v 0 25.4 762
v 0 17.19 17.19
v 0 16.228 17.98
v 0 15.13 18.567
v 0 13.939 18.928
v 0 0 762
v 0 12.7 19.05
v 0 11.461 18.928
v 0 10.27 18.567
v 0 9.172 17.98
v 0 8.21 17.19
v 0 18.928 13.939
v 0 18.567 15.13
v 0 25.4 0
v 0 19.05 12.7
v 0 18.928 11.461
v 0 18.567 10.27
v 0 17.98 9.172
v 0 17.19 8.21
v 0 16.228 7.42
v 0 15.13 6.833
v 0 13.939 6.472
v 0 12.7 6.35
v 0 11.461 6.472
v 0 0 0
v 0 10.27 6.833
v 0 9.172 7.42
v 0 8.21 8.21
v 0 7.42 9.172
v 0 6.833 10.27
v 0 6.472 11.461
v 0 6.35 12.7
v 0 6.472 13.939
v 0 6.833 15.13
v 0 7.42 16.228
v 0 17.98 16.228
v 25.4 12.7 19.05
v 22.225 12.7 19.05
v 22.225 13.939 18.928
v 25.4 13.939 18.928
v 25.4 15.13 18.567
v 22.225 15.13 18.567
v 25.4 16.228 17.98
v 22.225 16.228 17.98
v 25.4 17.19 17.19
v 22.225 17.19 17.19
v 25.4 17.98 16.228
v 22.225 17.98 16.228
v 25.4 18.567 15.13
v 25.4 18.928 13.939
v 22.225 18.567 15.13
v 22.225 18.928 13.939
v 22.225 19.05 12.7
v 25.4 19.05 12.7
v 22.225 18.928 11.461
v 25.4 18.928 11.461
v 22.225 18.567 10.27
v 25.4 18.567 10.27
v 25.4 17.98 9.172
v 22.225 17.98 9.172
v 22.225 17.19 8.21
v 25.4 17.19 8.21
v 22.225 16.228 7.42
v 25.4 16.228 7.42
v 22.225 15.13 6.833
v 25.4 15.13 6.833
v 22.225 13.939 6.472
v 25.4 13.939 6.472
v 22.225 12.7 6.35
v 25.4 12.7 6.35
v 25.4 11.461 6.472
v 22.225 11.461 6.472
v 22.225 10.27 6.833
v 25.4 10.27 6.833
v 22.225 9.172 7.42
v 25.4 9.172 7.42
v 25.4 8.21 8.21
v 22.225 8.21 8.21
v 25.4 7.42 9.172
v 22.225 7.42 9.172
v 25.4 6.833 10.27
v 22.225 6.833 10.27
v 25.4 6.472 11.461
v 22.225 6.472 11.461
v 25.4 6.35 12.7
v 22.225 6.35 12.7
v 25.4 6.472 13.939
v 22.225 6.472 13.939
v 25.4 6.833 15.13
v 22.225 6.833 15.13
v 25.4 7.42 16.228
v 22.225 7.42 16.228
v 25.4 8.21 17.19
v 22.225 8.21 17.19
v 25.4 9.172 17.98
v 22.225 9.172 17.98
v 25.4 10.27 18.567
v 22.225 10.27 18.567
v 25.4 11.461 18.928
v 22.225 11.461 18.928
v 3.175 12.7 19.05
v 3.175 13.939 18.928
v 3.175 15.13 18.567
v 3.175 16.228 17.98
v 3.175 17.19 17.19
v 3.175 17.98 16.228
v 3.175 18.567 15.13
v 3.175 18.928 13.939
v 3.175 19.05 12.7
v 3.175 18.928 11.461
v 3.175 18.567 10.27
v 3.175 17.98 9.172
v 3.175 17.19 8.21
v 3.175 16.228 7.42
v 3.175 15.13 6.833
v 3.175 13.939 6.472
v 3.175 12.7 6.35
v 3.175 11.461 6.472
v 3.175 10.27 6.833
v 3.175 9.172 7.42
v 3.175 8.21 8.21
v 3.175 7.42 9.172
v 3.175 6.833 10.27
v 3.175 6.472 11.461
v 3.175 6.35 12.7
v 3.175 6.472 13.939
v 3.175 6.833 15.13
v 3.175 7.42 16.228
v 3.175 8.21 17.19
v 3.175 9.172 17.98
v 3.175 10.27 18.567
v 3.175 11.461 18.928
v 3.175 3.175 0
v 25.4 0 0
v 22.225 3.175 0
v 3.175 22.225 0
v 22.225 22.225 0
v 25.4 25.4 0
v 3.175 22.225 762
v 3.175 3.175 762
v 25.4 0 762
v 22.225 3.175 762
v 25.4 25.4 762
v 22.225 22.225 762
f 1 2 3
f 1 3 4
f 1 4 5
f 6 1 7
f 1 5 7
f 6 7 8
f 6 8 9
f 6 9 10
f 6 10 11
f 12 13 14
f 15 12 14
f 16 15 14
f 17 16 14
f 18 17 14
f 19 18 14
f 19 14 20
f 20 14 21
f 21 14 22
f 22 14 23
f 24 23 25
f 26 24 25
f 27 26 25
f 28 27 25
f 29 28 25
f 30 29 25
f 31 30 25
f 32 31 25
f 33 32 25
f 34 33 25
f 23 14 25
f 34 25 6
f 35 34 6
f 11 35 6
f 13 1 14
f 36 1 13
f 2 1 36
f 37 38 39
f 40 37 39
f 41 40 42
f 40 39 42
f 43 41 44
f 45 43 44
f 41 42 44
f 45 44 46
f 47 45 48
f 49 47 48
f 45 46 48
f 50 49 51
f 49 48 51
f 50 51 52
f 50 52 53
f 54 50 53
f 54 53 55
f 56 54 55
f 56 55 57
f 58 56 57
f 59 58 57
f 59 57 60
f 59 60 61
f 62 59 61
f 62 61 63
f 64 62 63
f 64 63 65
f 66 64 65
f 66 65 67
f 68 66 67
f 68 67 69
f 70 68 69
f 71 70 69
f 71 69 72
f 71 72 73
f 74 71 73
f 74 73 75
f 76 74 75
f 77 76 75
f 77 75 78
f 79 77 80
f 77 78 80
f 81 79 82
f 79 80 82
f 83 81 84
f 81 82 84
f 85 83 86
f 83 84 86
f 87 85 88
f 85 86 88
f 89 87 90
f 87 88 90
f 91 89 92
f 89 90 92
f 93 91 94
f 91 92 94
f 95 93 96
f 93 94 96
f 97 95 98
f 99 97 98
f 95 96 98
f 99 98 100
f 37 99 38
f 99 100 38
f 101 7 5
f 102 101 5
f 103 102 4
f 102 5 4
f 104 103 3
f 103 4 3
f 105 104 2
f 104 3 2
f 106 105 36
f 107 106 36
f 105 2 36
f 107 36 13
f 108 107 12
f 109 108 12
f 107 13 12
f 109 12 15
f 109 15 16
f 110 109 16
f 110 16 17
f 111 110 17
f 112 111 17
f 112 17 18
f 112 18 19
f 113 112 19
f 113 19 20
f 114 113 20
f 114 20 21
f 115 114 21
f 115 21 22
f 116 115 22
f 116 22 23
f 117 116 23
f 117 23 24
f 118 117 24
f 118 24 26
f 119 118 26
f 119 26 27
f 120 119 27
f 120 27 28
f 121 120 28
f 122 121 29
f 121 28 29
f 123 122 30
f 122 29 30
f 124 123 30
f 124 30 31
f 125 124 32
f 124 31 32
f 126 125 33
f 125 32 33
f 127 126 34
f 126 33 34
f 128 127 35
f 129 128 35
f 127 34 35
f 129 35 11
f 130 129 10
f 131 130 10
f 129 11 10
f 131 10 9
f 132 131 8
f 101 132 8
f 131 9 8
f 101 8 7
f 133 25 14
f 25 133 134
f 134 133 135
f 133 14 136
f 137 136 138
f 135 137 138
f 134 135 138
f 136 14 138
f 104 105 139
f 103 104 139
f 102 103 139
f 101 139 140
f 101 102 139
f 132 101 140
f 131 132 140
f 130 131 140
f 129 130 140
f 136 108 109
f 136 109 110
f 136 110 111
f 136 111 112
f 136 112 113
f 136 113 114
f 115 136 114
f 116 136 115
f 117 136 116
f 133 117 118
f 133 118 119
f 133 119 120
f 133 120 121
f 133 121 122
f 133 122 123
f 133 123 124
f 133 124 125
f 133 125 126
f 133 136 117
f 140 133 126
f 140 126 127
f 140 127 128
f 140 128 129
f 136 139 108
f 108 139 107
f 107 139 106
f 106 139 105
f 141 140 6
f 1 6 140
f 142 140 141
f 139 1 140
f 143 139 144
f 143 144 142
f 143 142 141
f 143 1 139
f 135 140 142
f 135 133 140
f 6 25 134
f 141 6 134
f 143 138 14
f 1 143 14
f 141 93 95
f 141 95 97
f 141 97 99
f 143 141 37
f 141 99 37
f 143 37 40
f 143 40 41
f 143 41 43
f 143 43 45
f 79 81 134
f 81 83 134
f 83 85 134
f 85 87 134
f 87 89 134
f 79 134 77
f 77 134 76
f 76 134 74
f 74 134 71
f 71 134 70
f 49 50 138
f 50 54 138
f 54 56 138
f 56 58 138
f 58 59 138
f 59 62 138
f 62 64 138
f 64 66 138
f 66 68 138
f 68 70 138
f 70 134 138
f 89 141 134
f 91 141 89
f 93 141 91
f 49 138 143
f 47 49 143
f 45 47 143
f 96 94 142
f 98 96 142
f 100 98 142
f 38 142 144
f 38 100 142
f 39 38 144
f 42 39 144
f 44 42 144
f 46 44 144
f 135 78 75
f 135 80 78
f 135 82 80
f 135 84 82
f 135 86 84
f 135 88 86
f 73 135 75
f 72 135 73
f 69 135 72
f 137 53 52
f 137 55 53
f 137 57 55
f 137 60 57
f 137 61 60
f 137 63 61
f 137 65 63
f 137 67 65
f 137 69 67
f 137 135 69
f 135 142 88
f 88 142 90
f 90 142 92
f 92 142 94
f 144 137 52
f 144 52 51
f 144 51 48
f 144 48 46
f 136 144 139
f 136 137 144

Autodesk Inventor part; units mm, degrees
ref_plane "YZ Plane" through (0, 0, 0) normal (1, 0, 0) x (0, 1, 0)
ref_plane "XZ Plane" through (0, 0, 0) normal (0, 1, 0) x (-1, 0, 0)
ref_plane "XY Plane" through (0, 0, 0) normal (0, 0, 1) x (1, 0, 0)
sketch "Sketch1" plane through (0, 0, 0) normal (0, 0, 1) x (1, 0, 0)
  line L0 (0, 0) -> (25.4, 0)
  line L1 (25.4, 0) -> (25.4, 25.4)
  line L2 (25.4, 25.4) -> (0, 25.4)
  line L3 (0, 25.4) -> (0, 0)
  line L4 (3.175, 3.175) -> (22.225, 3.175)
  line L5 (22.225, 3.175) -> (22.225, 22.225)
  line L6 (22.225, 22.225) -> (3.175, 22.225)
  line L7 (3.175, 22.225) -> (3.175, 3.175)
  dimension "d0" = 25.4
  dimension "d1" = 25.4
  dimension "d2" = 3.175
extrude "Extrusion1" add sketch "Sketch1" along normal blind 762
sketch "Sketch2" plane through (0, 0, 0) normal (-1, 0, 0) x (0, 0, 1)
  circle A0 centre (12.7, 12.7) radius 6.35
  line L0 (0, 25.4) -> (0, 0) projected
  line L1 (0, 0) -> (762, 0) projected
  dimension "d5" = 12.7
  dimension "d6" = 12.7
  dimension "d7" = 12.7
extrude "Extrusion2" cut sketch "Sketch2" against normal blind 25.4
properties part number "support bar" material "Aluminum 6061"
